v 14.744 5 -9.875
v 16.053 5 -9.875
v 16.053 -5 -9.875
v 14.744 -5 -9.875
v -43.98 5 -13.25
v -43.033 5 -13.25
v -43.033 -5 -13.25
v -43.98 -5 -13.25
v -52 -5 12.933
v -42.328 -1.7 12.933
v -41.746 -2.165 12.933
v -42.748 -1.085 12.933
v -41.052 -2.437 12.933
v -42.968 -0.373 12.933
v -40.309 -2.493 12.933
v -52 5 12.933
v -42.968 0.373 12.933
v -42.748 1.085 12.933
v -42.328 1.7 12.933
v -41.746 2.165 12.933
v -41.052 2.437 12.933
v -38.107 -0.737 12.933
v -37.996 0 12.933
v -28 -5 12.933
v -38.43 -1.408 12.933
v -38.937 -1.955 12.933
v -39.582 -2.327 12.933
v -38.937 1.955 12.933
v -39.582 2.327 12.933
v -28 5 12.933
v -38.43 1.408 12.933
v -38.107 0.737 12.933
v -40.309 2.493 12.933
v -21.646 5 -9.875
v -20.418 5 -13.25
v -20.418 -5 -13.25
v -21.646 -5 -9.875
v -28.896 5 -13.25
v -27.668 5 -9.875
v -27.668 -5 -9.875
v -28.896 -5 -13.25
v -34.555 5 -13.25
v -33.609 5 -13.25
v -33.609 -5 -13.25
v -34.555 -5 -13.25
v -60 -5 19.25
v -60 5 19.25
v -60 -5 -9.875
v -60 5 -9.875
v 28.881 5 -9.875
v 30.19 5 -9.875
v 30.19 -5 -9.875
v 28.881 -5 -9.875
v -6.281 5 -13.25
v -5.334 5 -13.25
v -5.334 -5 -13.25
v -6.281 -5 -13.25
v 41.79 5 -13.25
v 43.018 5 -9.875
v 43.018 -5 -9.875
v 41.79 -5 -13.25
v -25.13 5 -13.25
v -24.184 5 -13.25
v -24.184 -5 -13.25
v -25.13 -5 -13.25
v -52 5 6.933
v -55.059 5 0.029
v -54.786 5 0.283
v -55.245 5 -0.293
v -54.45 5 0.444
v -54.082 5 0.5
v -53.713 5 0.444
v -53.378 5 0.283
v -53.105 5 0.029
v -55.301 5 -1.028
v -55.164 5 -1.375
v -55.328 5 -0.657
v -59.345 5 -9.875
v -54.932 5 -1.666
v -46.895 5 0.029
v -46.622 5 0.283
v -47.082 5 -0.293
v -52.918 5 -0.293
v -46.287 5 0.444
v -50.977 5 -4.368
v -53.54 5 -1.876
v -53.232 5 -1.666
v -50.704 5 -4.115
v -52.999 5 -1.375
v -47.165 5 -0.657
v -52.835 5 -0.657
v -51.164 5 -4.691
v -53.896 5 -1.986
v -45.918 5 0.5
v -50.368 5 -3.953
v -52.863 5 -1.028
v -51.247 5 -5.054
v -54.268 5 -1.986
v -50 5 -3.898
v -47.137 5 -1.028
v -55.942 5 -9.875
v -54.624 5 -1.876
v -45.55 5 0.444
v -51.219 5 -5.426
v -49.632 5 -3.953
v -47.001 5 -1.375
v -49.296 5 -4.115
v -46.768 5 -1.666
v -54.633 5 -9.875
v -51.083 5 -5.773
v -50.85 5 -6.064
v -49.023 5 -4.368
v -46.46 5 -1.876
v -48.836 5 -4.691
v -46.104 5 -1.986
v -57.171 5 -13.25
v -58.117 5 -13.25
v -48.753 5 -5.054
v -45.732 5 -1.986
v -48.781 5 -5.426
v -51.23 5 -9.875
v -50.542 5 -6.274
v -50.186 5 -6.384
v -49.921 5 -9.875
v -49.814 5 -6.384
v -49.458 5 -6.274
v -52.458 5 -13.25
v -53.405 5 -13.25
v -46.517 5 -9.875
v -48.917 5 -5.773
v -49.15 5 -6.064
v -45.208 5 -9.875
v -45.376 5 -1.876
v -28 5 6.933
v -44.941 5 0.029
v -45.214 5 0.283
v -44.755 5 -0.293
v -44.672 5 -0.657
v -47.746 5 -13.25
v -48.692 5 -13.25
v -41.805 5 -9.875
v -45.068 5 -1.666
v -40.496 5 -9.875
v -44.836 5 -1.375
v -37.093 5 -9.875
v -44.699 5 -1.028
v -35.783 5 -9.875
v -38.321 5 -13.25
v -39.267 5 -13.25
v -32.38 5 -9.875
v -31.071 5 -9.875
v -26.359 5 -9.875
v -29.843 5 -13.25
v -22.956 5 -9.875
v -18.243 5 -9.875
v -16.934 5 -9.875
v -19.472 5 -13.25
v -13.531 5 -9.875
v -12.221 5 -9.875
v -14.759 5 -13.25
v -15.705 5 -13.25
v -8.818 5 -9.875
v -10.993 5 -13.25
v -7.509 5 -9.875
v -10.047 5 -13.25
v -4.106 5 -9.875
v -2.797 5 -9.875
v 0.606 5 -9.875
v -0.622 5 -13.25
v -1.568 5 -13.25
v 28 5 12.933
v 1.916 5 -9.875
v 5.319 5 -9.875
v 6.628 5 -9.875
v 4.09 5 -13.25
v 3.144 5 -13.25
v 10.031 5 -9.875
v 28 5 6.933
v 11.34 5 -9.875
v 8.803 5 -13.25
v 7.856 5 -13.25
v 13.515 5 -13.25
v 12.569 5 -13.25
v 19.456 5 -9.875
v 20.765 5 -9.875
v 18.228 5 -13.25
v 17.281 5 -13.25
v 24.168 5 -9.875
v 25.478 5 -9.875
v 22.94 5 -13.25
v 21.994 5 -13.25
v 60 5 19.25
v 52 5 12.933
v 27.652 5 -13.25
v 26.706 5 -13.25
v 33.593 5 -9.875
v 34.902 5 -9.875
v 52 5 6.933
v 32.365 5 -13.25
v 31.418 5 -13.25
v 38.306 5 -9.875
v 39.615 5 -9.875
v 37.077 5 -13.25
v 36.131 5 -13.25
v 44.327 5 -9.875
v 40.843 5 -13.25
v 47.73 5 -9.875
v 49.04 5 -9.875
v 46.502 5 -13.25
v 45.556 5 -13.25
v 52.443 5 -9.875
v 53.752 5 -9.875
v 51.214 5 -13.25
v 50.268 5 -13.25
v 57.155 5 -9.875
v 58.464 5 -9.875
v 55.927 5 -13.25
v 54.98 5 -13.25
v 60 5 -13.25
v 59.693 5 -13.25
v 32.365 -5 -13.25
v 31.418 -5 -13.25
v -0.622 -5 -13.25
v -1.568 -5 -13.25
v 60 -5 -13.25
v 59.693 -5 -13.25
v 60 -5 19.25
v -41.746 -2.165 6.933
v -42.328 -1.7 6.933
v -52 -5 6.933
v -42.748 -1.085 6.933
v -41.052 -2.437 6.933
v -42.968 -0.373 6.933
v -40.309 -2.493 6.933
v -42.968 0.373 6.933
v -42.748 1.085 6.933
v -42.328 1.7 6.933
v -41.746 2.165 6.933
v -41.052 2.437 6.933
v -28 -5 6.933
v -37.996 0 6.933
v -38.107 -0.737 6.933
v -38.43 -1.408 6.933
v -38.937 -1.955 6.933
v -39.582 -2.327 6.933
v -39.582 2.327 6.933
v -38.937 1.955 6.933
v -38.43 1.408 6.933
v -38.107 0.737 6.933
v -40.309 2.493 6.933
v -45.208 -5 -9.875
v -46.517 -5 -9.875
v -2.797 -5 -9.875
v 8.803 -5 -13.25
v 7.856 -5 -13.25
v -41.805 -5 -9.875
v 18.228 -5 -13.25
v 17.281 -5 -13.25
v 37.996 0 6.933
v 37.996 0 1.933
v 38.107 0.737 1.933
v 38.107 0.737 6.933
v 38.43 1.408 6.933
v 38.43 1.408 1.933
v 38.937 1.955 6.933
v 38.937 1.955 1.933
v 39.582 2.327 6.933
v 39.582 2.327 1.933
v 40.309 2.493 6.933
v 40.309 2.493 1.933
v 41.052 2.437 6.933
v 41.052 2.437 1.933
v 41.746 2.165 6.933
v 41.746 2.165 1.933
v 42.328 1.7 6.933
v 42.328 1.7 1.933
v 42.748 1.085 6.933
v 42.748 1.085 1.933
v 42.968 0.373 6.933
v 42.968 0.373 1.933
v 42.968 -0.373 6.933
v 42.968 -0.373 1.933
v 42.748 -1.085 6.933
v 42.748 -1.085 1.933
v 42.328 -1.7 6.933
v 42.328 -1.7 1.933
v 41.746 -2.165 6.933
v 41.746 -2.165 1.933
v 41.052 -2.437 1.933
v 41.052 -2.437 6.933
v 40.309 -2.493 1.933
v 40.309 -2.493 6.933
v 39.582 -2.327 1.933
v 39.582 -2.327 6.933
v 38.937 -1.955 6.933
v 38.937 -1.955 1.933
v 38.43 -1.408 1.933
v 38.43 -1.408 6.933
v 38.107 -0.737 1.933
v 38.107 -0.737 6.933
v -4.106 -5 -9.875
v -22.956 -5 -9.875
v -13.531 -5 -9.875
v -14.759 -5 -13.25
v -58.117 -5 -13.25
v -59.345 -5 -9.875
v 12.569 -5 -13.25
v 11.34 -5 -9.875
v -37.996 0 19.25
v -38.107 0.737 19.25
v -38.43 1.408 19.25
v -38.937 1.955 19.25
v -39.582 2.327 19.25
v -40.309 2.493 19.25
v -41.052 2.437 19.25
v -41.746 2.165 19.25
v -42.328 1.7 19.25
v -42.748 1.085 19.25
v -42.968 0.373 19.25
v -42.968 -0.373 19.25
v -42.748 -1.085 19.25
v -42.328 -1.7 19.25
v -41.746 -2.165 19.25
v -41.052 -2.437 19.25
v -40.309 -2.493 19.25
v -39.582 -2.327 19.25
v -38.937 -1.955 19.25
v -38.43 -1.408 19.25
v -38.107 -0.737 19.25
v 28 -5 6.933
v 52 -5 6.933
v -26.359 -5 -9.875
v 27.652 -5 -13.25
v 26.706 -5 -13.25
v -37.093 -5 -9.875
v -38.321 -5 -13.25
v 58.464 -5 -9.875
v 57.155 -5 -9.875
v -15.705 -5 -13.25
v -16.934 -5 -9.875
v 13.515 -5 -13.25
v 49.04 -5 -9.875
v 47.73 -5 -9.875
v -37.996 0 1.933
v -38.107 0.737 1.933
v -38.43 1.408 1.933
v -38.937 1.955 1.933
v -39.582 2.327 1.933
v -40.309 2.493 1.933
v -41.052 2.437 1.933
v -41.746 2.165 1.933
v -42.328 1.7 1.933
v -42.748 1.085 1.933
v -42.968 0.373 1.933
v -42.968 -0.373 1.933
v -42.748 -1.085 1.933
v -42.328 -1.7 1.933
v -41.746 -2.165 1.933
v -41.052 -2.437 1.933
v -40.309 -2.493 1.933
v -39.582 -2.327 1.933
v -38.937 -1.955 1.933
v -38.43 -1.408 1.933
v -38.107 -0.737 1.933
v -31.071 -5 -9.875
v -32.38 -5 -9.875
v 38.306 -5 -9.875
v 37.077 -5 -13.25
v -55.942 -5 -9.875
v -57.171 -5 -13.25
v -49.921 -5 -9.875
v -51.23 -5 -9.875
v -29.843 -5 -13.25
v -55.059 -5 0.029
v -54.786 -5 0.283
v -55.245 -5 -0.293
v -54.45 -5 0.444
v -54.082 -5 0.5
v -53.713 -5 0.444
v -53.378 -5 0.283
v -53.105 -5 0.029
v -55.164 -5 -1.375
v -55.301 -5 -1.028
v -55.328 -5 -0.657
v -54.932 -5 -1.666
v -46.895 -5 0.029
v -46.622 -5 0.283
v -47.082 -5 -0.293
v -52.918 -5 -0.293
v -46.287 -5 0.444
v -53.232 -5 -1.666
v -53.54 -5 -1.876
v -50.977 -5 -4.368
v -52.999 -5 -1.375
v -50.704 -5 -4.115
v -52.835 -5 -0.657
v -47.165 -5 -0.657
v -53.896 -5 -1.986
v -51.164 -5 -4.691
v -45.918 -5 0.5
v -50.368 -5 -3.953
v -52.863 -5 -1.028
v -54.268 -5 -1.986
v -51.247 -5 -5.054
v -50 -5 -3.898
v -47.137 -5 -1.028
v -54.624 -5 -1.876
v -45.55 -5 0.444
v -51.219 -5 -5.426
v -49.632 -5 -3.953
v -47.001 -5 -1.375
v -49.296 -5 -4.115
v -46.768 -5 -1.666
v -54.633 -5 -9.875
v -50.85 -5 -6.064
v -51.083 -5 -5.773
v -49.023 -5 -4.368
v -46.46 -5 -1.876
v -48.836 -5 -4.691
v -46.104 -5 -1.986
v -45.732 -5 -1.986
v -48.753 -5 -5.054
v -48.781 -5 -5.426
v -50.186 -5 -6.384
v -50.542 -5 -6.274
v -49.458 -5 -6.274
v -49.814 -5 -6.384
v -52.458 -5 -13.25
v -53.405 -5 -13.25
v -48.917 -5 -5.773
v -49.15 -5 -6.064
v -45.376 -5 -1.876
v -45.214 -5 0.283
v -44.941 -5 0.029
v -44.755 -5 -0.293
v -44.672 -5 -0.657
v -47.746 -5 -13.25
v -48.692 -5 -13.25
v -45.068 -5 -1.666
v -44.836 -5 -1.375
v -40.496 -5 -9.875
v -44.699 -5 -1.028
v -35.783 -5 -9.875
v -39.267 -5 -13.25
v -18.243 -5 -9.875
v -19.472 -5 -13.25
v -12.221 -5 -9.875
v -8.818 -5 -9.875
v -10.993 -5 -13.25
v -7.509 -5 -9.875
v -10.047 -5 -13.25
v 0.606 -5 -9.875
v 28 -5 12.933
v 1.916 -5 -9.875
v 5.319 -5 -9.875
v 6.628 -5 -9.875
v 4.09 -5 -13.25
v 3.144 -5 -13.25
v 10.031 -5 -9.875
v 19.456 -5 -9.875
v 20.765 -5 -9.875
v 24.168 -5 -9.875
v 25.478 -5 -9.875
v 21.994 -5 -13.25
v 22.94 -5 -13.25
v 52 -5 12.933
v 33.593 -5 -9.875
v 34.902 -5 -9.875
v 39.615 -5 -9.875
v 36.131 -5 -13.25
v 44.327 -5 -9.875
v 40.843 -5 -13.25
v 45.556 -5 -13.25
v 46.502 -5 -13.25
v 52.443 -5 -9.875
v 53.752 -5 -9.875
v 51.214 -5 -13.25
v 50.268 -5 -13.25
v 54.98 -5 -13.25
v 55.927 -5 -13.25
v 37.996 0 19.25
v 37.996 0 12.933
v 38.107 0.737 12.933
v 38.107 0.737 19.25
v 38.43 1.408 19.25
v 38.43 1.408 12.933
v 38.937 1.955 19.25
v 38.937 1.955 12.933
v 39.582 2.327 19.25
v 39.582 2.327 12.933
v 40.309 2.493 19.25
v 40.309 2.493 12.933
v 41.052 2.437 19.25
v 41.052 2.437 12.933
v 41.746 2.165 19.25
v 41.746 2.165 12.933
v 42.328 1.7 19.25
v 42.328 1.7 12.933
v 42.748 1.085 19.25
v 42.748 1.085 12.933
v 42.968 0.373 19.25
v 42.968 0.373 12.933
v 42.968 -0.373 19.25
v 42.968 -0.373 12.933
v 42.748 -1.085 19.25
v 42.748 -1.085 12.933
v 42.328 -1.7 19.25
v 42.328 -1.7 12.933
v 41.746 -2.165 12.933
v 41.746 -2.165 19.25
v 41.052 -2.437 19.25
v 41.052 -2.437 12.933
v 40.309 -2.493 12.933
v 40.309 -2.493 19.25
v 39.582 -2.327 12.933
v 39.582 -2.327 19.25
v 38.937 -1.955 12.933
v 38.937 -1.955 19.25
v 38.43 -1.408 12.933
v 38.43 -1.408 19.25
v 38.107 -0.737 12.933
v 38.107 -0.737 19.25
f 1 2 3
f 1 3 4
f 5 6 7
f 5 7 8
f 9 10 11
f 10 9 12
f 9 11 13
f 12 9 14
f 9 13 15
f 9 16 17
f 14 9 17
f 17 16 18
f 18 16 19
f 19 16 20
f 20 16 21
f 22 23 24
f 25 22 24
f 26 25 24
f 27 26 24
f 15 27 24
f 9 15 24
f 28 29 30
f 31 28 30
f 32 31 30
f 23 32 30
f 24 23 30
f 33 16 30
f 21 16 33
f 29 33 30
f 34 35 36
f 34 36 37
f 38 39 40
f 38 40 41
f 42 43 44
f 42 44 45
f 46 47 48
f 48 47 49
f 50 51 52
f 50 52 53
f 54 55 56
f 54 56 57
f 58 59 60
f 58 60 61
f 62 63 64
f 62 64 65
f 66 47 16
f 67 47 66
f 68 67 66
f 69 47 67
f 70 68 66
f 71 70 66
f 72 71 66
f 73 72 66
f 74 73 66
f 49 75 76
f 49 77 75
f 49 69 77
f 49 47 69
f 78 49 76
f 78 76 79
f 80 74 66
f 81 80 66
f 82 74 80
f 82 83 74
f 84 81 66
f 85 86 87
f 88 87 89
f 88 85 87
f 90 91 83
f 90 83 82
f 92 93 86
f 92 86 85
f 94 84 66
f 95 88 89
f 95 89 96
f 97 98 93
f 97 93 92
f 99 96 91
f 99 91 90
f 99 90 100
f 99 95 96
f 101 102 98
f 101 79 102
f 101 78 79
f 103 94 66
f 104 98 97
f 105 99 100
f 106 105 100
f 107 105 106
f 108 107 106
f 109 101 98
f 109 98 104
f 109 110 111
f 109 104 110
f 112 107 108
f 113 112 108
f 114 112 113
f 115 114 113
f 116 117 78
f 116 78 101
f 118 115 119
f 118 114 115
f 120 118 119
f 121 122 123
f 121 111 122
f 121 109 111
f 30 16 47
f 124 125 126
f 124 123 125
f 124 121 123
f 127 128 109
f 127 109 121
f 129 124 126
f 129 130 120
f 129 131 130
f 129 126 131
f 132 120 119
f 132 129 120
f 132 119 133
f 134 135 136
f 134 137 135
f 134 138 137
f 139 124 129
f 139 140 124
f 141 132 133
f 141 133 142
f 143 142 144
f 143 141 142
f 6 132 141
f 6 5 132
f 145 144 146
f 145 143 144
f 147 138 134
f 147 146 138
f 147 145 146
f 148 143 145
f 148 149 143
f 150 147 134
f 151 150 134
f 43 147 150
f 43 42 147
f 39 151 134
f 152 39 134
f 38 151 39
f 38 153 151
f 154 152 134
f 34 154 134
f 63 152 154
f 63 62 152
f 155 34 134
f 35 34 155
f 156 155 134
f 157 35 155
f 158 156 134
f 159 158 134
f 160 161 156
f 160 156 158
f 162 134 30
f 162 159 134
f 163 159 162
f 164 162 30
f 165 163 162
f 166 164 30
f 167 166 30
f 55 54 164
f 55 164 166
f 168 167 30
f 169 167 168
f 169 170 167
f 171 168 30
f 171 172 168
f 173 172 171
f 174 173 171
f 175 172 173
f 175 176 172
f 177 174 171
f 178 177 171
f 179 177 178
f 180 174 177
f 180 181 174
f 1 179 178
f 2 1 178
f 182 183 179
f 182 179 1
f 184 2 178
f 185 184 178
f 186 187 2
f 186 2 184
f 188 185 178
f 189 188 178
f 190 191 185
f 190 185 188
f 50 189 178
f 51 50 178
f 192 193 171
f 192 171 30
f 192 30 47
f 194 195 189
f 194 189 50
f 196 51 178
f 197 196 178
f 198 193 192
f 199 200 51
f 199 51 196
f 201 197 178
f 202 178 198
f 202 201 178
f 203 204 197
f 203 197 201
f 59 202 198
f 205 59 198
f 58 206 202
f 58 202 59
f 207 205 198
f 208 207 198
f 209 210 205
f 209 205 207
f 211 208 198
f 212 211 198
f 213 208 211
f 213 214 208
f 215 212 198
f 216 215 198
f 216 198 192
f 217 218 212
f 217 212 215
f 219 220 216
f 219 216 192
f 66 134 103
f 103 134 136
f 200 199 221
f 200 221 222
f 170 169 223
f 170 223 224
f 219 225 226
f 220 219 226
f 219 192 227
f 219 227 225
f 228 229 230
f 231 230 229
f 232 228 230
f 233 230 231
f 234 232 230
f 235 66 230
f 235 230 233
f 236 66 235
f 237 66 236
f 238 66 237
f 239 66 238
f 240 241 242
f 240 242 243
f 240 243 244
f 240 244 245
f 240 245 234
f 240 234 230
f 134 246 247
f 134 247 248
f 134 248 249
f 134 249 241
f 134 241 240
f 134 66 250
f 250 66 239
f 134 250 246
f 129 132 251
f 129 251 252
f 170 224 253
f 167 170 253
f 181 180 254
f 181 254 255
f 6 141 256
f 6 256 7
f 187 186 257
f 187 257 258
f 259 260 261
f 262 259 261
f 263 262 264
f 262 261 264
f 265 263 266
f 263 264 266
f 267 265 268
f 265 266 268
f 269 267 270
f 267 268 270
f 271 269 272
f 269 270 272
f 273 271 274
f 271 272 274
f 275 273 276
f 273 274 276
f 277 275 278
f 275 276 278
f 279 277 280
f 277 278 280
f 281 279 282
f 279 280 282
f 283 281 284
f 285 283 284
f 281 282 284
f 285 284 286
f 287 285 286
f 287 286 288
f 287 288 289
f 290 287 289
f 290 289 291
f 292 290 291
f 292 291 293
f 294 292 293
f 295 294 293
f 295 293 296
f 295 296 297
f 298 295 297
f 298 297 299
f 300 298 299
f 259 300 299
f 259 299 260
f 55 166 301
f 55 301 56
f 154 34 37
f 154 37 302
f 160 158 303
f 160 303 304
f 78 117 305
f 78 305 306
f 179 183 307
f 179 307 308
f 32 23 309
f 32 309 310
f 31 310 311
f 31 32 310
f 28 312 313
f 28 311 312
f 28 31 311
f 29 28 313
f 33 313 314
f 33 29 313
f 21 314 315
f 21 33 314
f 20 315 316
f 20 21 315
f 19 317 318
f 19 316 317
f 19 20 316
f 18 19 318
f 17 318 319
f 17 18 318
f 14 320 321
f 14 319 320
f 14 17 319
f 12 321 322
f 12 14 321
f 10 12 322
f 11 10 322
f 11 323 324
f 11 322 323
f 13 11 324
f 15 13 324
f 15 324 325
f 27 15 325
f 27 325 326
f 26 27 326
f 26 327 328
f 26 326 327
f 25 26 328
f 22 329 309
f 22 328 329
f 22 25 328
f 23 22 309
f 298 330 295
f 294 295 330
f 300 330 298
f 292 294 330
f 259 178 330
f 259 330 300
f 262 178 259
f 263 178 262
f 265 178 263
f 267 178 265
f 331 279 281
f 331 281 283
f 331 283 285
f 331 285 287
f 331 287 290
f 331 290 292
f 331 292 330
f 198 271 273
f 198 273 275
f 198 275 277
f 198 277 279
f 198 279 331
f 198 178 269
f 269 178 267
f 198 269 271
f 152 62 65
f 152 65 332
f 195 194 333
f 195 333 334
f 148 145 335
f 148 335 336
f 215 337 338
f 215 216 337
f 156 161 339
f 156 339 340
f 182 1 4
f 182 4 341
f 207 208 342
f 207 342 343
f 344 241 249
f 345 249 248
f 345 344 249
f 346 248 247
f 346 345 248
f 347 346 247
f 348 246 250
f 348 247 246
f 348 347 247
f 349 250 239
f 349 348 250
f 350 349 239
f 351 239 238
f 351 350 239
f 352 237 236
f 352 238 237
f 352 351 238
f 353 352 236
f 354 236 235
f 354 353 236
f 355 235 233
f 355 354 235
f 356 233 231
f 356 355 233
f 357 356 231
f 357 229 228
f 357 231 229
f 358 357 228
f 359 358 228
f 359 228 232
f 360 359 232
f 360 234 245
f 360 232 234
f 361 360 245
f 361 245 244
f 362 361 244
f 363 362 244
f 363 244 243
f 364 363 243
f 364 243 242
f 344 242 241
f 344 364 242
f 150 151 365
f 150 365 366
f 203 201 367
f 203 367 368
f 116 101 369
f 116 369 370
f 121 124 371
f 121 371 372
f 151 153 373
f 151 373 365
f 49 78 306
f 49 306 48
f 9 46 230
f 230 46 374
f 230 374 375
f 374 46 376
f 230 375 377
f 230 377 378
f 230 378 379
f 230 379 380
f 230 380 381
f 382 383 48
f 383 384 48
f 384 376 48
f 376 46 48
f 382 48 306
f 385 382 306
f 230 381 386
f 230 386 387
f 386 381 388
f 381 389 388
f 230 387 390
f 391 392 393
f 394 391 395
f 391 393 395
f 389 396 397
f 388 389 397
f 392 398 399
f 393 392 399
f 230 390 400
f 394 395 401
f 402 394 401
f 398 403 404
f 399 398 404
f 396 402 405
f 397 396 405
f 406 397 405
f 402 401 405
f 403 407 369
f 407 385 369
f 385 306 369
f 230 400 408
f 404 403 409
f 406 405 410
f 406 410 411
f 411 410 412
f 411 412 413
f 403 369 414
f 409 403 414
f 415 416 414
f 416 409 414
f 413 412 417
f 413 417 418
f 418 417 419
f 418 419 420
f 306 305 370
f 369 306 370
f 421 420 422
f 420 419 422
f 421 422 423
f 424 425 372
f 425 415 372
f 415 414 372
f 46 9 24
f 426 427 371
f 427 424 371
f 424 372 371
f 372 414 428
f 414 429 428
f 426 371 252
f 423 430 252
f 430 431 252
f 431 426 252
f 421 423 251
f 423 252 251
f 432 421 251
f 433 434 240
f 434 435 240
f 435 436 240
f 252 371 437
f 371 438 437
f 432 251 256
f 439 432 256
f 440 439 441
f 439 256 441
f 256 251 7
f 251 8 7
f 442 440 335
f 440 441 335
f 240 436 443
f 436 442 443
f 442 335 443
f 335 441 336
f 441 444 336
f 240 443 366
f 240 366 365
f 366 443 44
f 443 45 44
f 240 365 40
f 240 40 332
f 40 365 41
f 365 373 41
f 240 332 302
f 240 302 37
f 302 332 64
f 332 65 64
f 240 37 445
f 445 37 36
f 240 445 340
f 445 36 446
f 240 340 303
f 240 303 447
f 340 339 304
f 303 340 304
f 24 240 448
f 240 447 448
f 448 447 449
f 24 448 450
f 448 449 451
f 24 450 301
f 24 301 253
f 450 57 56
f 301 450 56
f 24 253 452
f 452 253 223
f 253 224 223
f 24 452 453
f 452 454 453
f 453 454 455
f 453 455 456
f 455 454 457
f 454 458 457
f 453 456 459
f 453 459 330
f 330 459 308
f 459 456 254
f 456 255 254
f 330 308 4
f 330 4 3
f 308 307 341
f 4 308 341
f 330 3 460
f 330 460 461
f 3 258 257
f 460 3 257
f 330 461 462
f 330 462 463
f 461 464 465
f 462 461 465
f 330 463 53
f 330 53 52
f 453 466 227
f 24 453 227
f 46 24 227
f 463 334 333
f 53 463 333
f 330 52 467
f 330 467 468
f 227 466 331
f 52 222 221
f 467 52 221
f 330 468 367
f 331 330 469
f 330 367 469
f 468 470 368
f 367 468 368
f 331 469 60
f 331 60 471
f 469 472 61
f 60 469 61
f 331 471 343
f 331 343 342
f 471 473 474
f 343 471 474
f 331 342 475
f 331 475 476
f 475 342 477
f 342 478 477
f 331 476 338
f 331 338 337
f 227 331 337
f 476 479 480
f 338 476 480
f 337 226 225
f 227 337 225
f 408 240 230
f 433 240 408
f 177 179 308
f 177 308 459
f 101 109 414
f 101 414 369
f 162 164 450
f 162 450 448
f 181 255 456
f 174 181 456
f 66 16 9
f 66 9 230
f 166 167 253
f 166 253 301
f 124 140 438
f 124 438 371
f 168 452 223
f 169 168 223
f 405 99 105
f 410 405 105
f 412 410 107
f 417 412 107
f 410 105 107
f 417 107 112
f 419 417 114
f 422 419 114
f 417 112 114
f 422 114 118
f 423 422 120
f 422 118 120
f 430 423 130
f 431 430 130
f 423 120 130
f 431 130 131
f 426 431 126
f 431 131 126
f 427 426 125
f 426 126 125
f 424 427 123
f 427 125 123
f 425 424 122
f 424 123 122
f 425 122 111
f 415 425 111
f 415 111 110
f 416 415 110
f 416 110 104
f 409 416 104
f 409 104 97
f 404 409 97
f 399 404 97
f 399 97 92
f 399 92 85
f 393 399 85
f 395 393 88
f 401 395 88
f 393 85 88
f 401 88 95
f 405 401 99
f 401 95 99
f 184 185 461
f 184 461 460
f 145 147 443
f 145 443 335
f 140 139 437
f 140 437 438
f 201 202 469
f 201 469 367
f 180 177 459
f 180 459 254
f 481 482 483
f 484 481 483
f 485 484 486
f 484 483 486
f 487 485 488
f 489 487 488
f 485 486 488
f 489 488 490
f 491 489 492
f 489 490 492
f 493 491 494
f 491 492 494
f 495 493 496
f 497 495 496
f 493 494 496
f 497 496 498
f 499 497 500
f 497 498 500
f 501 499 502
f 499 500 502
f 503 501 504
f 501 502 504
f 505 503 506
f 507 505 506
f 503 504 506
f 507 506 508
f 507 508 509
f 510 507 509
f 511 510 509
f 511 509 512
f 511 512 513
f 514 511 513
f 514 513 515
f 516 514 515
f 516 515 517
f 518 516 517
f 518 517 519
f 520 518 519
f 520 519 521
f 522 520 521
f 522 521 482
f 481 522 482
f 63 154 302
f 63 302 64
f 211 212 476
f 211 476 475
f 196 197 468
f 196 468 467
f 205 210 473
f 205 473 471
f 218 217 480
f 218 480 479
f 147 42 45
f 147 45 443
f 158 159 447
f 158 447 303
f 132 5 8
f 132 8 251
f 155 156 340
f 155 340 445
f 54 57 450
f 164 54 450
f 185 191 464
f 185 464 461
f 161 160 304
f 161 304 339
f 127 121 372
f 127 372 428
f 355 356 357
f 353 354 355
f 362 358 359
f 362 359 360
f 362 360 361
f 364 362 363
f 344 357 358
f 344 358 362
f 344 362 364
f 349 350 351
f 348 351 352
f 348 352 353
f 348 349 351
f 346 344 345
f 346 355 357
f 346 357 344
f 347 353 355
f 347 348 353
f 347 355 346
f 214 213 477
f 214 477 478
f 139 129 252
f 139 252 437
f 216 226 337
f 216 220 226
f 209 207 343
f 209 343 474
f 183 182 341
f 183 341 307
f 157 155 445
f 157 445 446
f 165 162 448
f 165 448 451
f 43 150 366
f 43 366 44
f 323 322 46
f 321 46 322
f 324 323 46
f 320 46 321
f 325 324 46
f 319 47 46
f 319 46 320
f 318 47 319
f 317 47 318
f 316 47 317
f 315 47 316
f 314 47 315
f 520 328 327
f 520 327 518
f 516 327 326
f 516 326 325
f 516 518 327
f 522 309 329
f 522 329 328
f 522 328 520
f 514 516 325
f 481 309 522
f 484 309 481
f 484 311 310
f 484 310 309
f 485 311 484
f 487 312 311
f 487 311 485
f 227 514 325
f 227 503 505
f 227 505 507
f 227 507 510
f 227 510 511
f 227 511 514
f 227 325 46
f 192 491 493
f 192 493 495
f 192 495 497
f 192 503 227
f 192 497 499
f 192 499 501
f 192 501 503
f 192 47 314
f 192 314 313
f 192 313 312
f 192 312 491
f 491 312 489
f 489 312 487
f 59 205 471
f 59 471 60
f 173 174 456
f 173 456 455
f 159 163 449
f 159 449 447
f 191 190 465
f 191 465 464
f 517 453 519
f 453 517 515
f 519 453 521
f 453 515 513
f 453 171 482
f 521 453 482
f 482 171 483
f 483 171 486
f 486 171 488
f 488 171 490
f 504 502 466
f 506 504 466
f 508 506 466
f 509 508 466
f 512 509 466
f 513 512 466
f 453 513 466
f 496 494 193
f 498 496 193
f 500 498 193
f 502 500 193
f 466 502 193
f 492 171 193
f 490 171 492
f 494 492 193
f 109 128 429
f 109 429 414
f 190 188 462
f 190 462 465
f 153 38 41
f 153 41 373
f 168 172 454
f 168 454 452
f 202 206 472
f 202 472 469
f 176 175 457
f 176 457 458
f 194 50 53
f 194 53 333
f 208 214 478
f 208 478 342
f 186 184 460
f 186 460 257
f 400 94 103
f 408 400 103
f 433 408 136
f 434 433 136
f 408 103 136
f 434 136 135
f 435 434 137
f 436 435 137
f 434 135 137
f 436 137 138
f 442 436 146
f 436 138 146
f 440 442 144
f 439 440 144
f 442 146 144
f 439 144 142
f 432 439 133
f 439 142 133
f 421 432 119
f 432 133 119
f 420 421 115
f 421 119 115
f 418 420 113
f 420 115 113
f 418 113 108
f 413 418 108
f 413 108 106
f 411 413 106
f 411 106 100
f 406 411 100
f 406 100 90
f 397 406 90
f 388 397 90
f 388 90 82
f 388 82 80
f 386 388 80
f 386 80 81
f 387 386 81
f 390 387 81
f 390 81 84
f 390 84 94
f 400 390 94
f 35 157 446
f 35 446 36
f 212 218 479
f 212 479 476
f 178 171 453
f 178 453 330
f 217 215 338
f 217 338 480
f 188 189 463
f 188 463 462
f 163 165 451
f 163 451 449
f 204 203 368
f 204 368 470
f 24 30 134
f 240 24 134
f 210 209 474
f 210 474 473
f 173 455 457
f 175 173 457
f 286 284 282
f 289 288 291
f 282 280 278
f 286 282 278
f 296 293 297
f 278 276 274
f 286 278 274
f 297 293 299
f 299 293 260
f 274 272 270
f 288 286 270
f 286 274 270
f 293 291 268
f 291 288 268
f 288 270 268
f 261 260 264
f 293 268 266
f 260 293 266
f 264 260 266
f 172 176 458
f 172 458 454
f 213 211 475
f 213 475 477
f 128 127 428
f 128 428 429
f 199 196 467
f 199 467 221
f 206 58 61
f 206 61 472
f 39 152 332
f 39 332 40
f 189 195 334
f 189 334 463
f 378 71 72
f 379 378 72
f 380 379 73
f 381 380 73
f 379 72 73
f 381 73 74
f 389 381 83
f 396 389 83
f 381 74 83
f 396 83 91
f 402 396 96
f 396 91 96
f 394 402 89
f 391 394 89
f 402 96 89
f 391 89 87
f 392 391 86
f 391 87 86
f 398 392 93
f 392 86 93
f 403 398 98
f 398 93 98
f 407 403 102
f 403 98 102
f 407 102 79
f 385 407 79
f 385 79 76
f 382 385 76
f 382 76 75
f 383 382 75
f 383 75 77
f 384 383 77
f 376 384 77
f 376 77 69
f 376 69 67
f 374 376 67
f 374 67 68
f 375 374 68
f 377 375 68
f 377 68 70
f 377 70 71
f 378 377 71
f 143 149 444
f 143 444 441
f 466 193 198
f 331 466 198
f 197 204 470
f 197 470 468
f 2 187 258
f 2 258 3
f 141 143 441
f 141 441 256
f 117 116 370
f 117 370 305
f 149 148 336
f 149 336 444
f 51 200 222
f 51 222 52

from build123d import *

# Parameters (mm, degrees)
BOSS_EXTRUDE1_DEPTH = 5
SKETCH3_W           = 120
SKETCH3_H           = 6
BOSS_EXTRUDE2_DEPTH = 10
SKETCH5_W           = 24
SKETCH5_H           = 6
CUT_EXTRUDE1_DEPTH  = 10
CUT_EXTRUDE2_START  = -5
SKETCH7_R           = 2.5
CUT_EXTRUDE2_DEPTH  = 25
SKETCH8_R           = 1.25
CUT_EXTRUDE3_DEPTH  = 20
SKETCH9_R           = 1.25
CUT_EXTRUDE4_DEPTH  = 10


with BuildPart() as part:
    # Sketch1 → Boss-Extrude1 (new, symmetric)
    with BuildSketch(Plane(origin=(0, 0, 0), x_dir=(1, 0, 0), z_dir=(0, 1, 0))):
        Polygon((58.46437743, 9.875), (57.15507132, 9.875), (55.92667178, 13.25), (54.980387995, 13.25), (53.751988455, 9.875), (52.442682345, 9.875), (51.214282805, 13.25), (50.26799902, 13.25), (49.03959948, 9.875), (47.73029337, 9.875), (46.50189383, 13.25), (45.555610045, 13.25), (44.327210505, 9.875), (43.017904395, 9.875), (41.789504855, 13.25), (40.84322107, 13.25), (39.61482153, 9.875), (38.30551542, 9.875), (37.07711588, 13.25), (36.130832095, 13.25), (34.902432555, 9.875), (33.593126445, 9.875), (32.364726905, 13.25), (31.41844312, 13.25), (30.19004358, 9.875), (28.88073747, 9.875), (27.65233793, 13.25), (26.706054145, 13.25), (25.477654605, 9.875), (24.168348495, 9.875), (22.939948955, 13.25), (21.99366517, 13.25), (20.76526563, 9.875), (19.45595952, 9.875), (18.22755998, 13.25), (17.281276195, 13.25), (16.052876655, 9.875), (14.743570545, 9.875), (13.515171005, 13.25), (12.56888722, 13.25), (11.34048768, 9.875), (10.03118157, 9.875), (8.80278203, 13.25), (7.856498245, 13.25), (6.628098705, 9.875), (5.318792595, 9.875), (4.090393055, 13.25), (3.14410927, 13.25), (1.91570973, 9.875), (0.60640362, 9.875), (-0.62199592, 13.25), (-1.568279705, 13.25), (-2.796679245, 9.875), (-4.105985355, 9.875), (-5.334384895, 13.25), (-6.28066868, 13.25), (-7.50906822, 9.875), (-8.81837433, 9.875), (-10.04677387, 13.25), (-10.993057655, 13.25), (-12.221457195, 9.875), (-13.530763305, 9.875), (-14.759162845, 13.25), (-15.70544663, 13.25), (-16.93384617, 9.875), (-18.24315228, 9.875), (-19.47155182, 13.25), (-20.417835605, 13.25), (-21.646235145, 9.875), (-22.955541255, 9.875), (-24.183940795, 13.25), (-25.13022458, 13.25), (-26.35862412, 9.875), (-27.66793023, 9.875), (-28.89632977, 13.25), (-29.842613555, 13.25), (-31.071013095, 9.875), (-32.380319205, 9.875), (-33.608718745, 13.25), (-34.55500253, 13.25), (-35.78340207, 9.875), (-37.09270818, 9.875), (-38.32110772, 13.25), (-39.267391505, 13.25), (-40.495791045, 9.875), (-41.805097155, 9.875), (-43.033496695, 13.25), (-43.97978048, 13.25), (-45.20818002, 9.875), (-46.51748613, 9.875), (-47.74588567, 13.25), (-48.692169455, 13.25), (-49.920568995, 9.875), (-51.229875105, 9.875), (-52.458274645, 13.25), (-53.40455843, 13.25), (-54.63295797, 9.875), (-55.94226408, 9.875), (-57.17066362, 13.25), (-58.116947405, 13.25), (-59.345346945, 9.875), (-60, 9.875), (-60, -13.25), (60, -13.25), (60, 13.25), (59.69277697, 13.25), align=None)
    extrude(amount=BOSS_EXTRUDE1_DEPTH, both=True)

    # Sketch3 → Boss-Extrude2 (add)
    with BuildSketch(Plane(origin=(0, 5, 0), x_dir=(1, 0, 0), z_dir=(0, 1, 0))):
        with Locations((0, -16.25)):
            Rectangle(SKETCH3_W, SKETCH3_H)
    extrude(amount=-BOSS_EXTRUDE2_DEPTH)

    # Sketch5 → Cut-Extrude1 (cut)
    with BuildSketch(Plane(origin=(0, 5, 0), x_dir=(1, 0, 0), z_dir=(0, 1, 0))):
        with Locations((-40, -9.932851702)):
            Rectangle(SKETCH5_W, SKETCH5_H)
        with Locations((40, -9.932851702)):
            Rectangle(SKETCH5_W, SKETCH5_H)
    extrude(amount=-CUT_EXTRUDE1_DEPTH, mode=Mode.SUBTRACT)

    # Sketch7 → Cut-Extrude2 (cut)
    with BuildSketch(Plane.XY.offset(6.932851702).offset(CUT_EXTRUDE2_START)):
        with Locations((-40.495791045, 0)):
            Circle(SKETCH7_R)
    cut_extrude2 = extrude(amount=CUT_EXTRUDE2_DEPTH, mode=Mode.SUBTRACT)

    # Mirror1: Cut-Extrude2 across plane
    add(cut_extrude2.mirror(Plane(origin=(0, 0, 0), x_dir=(0, 0, 1), z_dir=(1, 0, 0))), mode=Mode.SUBTRACT)

    # Sketch8 → Cut-Extrude3 (cut)
    with BuildSketch(Plane(origin=(0, 5, 0), x_dir=(1, 0, 0), z_dir=(0, 1, 0))):
        with Locations(Location((-54.081860638, 0.75, 0), (0, 0, 270))):
            Circle(SKETCH8_R)
        with Locations(Location((-45.918139363, 0.75, 0), (0, 0, 270))):
            Circle(SKETCH8_R)
    extrude(amount=-CUT_EXTRUDE3_DEPTH, mode=Mode.SUBTRACT)

    # Sketch9 → Cut-Extrude4 (cut)
    with BuildSketch(Plane(origin=(0, 5, 0), x_dir=(1, 0, 0), z_dir=(0, 1, 0))):
        with Locations(Location((-50, 5.147546331, 0), (0, 0, 270))):
            Circle(SKETCH9_R)
    extrude(amount=-CUT_EXTRUDE4_DEPTH, mode=Mode.SUBTRACT)


solid = part.part
